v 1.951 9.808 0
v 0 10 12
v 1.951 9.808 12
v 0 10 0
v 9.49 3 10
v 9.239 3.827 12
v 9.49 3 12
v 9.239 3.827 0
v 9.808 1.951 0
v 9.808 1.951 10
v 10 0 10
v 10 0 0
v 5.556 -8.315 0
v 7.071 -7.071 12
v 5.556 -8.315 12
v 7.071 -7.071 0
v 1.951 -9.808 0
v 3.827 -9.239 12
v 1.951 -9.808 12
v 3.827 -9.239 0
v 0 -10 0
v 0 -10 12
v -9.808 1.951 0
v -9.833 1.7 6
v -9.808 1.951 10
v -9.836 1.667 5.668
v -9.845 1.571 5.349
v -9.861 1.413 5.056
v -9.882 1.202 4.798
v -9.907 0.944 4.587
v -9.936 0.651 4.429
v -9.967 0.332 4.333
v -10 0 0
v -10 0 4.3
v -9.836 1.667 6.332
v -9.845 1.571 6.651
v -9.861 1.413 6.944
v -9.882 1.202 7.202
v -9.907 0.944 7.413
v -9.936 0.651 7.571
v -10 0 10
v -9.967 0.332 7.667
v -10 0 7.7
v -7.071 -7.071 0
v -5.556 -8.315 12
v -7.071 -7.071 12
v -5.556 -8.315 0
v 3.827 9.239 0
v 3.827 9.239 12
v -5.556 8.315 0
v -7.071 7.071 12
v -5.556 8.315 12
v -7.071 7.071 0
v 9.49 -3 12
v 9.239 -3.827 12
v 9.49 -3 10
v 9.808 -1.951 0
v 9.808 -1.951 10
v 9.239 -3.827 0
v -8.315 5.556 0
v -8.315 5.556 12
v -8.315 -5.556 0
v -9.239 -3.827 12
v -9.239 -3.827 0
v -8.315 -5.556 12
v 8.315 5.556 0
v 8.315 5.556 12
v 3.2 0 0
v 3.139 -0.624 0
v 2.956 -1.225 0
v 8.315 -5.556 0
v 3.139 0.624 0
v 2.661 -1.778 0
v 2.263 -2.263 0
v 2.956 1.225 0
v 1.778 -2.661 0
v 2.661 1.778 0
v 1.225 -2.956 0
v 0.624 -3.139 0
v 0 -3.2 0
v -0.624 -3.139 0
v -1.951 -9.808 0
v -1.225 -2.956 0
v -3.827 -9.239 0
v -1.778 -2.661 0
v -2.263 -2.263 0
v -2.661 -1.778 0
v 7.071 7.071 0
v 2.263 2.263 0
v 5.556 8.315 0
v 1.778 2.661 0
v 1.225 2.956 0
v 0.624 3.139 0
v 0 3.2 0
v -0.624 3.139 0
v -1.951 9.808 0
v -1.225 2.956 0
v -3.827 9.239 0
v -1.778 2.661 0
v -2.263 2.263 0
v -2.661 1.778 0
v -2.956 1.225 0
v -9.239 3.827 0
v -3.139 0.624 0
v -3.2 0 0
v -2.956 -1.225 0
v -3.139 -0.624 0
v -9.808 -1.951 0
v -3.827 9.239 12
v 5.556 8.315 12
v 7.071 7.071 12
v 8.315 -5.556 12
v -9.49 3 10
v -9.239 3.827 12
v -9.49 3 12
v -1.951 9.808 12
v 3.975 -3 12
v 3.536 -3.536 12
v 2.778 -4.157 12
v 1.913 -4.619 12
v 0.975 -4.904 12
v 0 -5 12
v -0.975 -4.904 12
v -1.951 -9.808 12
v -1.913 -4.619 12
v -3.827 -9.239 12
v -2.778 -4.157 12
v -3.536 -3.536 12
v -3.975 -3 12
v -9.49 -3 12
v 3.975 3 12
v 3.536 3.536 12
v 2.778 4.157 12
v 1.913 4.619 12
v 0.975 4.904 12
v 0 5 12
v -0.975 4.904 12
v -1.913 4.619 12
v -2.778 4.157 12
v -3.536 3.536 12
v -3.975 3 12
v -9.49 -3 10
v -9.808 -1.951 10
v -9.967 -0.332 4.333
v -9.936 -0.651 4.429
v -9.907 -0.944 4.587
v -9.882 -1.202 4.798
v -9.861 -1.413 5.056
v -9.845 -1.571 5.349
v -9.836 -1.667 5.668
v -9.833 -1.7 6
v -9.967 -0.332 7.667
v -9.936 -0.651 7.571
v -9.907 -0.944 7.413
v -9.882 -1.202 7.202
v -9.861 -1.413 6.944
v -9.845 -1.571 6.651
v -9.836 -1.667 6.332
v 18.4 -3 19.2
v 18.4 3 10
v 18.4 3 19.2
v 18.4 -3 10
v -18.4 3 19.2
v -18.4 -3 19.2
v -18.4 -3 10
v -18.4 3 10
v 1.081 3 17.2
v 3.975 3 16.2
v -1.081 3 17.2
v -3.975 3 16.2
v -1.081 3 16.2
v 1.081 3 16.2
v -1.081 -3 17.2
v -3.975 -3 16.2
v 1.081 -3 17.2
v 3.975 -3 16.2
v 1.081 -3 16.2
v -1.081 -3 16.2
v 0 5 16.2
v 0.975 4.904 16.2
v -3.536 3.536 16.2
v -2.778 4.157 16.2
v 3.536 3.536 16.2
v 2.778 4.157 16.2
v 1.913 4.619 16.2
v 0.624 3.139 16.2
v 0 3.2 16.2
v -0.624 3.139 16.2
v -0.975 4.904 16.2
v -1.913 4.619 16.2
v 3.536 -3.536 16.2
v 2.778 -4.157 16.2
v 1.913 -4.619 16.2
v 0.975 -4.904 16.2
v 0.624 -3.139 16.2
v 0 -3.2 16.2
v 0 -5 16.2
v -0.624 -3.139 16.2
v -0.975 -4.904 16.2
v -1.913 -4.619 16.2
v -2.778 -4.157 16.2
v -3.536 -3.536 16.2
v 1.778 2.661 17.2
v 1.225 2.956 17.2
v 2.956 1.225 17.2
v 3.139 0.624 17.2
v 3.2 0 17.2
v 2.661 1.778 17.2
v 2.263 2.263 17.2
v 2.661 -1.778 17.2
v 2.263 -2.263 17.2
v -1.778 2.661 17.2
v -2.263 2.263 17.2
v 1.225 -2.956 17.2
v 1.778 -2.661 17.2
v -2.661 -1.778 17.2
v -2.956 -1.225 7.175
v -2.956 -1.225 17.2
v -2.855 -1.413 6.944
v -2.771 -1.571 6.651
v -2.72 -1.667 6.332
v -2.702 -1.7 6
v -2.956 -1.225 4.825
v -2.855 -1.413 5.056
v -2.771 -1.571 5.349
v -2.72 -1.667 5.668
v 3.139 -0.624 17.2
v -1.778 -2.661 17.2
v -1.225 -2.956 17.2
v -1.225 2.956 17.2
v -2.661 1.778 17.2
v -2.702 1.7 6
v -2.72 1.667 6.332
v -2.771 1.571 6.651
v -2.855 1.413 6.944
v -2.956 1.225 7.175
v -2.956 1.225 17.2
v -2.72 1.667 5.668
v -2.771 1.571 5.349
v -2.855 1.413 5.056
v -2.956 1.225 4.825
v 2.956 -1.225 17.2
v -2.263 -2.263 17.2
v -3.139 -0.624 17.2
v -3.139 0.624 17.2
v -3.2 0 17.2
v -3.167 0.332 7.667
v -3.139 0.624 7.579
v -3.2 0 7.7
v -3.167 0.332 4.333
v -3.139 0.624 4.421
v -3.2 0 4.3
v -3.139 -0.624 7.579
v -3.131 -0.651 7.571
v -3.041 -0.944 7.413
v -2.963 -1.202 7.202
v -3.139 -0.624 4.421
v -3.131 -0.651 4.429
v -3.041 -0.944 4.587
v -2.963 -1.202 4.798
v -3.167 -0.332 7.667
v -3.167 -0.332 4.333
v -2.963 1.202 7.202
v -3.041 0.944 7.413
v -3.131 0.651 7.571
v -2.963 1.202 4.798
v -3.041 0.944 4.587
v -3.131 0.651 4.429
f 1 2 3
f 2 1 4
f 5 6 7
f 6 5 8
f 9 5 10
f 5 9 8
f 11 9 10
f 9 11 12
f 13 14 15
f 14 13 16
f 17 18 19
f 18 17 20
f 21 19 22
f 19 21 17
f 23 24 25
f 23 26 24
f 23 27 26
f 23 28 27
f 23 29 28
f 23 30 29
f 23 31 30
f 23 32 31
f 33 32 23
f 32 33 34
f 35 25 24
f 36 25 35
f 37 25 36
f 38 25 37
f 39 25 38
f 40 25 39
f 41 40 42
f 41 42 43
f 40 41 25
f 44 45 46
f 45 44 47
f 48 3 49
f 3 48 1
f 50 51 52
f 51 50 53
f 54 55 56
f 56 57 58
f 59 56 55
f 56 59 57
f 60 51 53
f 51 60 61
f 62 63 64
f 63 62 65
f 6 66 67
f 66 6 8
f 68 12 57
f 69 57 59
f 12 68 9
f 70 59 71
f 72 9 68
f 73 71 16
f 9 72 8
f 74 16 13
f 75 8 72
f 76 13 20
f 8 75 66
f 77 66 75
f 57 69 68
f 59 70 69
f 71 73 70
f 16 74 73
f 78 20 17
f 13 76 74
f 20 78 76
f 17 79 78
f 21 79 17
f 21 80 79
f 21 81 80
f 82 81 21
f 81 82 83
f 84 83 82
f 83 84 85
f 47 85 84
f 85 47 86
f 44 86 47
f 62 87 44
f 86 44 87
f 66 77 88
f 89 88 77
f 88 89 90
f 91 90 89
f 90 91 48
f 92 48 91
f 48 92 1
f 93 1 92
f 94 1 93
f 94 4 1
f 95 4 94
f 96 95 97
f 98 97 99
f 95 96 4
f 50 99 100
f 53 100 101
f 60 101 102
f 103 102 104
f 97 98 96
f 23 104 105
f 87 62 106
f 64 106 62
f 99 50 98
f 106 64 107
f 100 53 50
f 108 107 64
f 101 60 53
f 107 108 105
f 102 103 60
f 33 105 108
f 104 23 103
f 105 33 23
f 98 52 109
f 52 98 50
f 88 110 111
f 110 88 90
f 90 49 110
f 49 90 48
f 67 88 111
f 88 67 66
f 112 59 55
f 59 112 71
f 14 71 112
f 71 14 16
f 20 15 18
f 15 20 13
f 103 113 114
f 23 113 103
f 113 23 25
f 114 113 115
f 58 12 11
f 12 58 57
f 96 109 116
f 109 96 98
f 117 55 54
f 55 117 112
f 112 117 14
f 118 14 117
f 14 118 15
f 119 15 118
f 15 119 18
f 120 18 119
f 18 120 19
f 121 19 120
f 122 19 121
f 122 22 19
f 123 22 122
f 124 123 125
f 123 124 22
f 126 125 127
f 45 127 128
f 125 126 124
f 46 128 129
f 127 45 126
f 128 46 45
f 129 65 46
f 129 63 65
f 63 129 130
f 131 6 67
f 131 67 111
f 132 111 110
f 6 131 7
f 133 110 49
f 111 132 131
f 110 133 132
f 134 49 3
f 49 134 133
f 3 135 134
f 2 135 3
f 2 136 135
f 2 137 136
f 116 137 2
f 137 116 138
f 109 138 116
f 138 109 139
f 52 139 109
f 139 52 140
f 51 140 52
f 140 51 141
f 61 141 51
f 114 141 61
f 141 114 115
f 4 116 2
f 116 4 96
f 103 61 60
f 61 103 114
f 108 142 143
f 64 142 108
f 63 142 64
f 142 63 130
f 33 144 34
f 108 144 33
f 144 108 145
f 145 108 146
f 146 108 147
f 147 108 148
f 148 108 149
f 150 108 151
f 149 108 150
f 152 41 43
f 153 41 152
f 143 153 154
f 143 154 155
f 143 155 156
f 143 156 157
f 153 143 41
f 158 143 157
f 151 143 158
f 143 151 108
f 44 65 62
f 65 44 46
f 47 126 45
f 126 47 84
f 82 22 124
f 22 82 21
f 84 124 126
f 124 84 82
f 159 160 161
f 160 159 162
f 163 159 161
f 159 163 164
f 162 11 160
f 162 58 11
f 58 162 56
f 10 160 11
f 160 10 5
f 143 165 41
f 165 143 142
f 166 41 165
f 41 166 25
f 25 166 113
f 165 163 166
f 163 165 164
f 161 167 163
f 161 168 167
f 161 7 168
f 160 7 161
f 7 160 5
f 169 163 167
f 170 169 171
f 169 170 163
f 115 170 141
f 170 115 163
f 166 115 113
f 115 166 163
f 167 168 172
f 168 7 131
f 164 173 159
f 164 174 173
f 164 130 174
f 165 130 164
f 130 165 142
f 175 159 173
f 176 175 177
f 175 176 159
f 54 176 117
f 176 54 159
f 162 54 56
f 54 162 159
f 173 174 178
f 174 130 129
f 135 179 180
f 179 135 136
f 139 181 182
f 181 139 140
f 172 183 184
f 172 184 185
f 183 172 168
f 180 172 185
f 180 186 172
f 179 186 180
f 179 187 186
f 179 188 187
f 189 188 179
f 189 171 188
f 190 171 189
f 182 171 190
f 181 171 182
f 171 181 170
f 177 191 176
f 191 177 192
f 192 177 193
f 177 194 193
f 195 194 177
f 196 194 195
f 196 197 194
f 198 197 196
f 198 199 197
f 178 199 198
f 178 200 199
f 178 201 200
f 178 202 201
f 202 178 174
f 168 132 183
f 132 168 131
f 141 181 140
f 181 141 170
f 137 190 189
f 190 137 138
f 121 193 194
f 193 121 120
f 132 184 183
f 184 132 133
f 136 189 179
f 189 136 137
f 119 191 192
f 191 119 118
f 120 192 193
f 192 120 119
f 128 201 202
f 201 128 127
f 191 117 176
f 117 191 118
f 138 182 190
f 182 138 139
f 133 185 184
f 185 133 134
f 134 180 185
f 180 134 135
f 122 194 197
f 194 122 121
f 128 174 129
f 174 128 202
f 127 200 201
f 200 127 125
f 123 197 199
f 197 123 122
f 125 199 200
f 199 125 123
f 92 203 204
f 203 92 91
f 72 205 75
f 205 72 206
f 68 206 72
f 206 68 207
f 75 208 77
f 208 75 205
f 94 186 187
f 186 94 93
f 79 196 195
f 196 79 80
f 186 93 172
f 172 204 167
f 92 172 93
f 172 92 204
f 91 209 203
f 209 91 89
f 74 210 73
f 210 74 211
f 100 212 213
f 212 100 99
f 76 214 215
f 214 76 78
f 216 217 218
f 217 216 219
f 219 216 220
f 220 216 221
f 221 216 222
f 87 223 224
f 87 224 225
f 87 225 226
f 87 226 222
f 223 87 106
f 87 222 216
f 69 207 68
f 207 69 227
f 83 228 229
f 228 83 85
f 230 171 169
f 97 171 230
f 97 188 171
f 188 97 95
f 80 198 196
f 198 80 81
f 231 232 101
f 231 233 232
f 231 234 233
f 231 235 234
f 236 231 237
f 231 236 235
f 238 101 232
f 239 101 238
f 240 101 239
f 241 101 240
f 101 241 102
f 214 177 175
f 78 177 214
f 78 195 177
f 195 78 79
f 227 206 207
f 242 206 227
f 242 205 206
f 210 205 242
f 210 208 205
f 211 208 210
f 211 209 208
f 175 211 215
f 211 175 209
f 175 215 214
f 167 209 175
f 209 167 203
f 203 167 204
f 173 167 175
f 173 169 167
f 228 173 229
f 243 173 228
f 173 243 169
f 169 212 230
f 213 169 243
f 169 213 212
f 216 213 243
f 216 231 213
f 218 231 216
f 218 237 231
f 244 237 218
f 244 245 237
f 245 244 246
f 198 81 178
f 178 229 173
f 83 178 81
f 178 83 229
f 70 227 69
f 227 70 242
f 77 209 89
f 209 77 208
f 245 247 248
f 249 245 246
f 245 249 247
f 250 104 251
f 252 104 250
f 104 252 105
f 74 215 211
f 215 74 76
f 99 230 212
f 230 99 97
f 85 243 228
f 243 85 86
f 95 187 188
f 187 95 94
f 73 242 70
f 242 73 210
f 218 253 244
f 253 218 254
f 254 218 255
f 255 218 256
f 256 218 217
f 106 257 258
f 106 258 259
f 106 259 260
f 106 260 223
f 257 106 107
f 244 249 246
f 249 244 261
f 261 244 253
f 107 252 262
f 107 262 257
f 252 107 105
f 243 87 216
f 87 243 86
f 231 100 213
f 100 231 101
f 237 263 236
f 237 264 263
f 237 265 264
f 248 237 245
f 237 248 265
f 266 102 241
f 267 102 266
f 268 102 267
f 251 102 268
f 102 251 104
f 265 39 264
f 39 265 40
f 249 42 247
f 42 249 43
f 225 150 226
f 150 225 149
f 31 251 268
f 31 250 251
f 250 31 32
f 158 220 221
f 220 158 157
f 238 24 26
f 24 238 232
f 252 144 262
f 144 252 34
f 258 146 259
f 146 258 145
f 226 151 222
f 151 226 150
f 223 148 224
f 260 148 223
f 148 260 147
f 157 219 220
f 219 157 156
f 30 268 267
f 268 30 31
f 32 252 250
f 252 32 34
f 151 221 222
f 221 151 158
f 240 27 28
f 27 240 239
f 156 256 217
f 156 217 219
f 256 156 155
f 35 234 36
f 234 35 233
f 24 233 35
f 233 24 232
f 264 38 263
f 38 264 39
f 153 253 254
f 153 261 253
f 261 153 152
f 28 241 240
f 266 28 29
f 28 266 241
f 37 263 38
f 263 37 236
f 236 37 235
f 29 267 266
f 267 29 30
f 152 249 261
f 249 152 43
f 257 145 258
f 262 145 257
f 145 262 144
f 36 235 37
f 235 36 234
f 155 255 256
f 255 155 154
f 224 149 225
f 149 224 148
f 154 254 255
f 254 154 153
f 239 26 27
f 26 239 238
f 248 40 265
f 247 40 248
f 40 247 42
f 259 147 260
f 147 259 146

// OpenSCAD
$fn = 32;

// ----------------------------------------------------------------------
// Hand knob: 20 x 36.8 x 16.2 mm
// ----------------------------------------------------------------------

// --- parameters (mm) ---
grip_d = 20;              // knob diameter
grip_h = 12;              // knob height
shaft_d = 6.4;            // shaft bore
set_d = 3.4;              // set screw tap hole
wing_l = 36.8;            // wing span
wing_w = 6;               // wing width
wing_h = 7.2;             // wing thickness
cap_h = 4.2;              // raised centre cap
cap_d = 10;               // centre cap diameter

module body() {
  cylinder(h = grip_h, d = grip_d);
}

module wing() {
  /* wing sunk 2 mm into the knob so the joint overlaps */
  translate([-wing_l / 2, -wing_w / 2, grip_h - 2])
    cube([wing_l, wing_w, wing_h + 2]);
}

module cap() {
  translate([0, 0, grip_h - 1]) cylinder(h = cap_h + 1, d = cap_d);
}

difference() {
  union() {
    body();
    wing();
    cap();
  }
  translate([0, 0, -1]) cylinder(h = grip_h + cap_h + 2, d = shaft_d);
  translate([-grip_d / 2 - 1, 0, grip_h * 0.5]) rotate([0, 90, 0]) cylinder(h = grip_d / 2 + 2, d = set_d);
}
